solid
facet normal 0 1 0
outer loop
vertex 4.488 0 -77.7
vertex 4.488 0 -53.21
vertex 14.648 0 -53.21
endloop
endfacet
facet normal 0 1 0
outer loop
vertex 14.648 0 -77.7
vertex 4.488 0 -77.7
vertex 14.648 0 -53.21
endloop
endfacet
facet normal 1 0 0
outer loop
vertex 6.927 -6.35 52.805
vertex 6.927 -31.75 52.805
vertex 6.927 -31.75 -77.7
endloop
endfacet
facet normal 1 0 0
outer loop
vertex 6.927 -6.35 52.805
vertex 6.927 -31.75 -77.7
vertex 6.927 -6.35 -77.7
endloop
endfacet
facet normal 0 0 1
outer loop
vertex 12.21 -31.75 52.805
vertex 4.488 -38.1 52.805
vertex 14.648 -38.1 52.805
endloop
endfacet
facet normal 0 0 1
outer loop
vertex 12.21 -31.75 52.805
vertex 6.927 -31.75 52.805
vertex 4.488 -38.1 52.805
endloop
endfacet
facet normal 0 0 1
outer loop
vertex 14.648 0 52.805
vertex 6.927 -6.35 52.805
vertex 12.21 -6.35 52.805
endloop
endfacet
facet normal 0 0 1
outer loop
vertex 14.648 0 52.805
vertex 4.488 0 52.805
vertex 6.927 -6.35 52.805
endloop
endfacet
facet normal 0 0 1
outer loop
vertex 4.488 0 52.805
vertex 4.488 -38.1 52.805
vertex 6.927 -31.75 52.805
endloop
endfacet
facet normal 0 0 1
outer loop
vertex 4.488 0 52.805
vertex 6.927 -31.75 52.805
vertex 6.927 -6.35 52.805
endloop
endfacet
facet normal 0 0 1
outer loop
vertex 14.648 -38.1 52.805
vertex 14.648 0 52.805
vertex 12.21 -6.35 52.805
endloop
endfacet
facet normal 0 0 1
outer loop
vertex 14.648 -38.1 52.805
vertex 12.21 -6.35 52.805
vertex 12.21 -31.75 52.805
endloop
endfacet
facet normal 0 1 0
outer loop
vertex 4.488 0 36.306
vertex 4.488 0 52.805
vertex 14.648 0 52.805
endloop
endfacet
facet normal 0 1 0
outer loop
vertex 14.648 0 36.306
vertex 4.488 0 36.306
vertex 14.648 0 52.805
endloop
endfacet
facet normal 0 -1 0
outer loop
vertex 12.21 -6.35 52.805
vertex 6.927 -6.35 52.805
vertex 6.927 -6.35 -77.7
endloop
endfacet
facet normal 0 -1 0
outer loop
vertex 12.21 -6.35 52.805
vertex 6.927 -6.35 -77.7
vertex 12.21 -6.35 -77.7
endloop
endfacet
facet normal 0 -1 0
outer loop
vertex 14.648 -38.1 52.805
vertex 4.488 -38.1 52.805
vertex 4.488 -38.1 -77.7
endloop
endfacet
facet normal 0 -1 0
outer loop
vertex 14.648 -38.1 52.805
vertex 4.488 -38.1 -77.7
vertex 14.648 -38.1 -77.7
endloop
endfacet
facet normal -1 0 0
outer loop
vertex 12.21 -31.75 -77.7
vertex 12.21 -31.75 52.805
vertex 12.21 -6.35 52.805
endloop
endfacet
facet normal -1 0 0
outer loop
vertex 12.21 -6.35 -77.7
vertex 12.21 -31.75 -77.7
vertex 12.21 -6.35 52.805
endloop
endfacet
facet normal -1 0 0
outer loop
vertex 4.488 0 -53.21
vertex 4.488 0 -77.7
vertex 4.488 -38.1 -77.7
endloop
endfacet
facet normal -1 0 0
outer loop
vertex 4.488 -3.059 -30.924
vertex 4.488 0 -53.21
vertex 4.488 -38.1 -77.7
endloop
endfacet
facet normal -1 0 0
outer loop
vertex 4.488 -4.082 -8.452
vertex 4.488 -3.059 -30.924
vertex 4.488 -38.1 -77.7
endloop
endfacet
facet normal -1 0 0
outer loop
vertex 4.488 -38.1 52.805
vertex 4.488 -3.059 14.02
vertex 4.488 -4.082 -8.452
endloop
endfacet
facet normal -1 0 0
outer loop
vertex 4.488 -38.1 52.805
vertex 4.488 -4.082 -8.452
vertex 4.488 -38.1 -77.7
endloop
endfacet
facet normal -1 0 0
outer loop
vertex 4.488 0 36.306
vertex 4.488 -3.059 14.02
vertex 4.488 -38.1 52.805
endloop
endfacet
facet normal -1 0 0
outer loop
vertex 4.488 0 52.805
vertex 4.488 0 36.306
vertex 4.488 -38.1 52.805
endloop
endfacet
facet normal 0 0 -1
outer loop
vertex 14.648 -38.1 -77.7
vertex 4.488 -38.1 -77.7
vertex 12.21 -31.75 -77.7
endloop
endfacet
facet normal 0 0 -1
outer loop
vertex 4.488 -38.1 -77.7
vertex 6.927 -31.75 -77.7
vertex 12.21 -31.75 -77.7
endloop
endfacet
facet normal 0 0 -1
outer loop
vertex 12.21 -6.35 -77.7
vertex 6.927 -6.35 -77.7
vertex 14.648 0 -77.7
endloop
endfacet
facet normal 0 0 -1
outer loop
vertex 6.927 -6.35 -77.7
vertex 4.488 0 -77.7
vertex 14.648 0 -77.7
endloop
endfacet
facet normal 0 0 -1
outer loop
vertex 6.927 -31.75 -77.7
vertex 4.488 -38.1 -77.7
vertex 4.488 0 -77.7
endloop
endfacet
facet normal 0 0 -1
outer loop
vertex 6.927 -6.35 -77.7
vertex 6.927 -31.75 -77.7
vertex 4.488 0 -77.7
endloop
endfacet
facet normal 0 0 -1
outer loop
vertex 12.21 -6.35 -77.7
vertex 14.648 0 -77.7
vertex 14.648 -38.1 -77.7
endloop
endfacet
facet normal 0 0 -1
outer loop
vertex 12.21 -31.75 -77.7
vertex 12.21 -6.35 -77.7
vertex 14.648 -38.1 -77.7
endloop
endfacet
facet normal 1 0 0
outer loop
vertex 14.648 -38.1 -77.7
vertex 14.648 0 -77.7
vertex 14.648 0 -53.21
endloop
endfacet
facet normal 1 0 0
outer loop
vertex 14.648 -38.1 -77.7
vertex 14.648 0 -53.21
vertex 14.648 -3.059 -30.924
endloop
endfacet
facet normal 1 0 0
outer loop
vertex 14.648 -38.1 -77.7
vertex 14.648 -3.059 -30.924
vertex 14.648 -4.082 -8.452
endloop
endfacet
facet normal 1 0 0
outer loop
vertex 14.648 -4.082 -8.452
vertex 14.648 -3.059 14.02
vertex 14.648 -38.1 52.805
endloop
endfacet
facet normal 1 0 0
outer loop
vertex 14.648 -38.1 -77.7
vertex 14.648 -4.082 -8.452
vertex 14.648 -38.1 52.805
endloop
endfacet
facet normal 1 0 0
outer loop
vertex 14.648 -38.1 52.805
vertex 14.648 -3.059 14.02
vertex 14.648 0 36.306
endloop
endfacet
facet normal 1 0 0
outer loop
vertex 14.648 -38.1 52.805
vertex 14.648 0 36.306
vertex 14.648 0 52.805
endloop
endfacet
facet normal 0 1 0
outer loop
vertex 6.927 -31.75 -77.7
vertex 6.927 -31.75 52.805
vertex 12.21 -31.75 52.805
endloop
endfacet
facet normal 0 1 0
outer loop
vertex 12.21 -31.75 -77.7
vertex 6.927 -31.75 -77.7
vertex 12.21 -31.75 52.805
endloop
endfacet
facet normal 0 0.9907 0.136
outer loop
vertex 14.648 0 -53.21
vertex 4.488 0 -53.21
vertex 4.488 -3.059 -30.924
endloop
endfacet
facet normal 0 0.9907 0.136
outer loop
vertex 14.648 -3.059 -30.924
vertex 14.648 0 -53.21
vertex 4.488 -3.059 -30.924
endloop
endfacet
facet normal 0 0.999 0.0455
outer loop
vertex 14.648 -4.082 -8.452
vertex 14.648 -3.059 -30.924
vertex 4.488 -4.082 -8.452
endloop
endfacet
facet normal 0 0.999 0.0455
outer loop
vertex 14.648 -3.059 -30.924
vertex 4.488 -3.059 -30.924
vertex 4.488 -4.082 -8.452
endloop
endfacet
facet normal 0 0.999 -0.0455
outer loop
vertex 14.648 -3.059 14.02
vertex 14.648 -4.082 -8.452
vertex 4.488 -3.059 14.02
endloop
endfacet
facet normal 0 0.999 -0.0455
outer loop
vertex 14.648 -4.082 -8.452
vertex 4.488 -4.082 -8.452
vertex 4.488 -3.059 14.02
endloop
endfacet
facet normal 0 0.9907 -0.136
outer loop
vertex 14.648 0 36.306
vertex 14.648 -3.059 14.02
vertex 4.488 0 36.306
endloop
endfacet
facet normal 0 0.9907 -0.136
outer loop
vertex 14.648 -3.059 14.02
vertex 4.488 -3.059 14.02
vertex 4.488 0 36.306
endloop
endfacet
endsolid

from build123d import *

# Parameters (mm, degrees)
F0_W     = 10.16
F0_H     = 130.5052
F1_DEPTH = 38.1
F5_DEPTH = 25.4
F3_W     = 5.2832
F3_H     = 25.4
F6_DEPTH = 152.4


with BuildPart() as f1:
    # F0 (on Front) → F1 (new body)
    with BuildSketch(Plane.XZ):
        with Locations((9.568245, -12.447174)):
            Rectangle(F0_W, F0_H)
    extrude(amount=F1_DEPTH)

    # F4 (on face) → F5 (cut)
    with BuildSketch(Plane(origin=(4.488245, 0, 0), x_dir=(0, -1, 0), z_dir=(-1, 0, 0))):
        with BuildLine():
            Line((0, 36.306467), (0, -53.210054))
            ThreePointArc((0, -53.210054), (4.081656, -8.451793), (0, 36.306467))
        make_face()
    extrude(amount=-F5_DEPTH, mode=Mode.SUBTRACT)

    # F3 (on face) → F6 (cut)
    with BuildSketch(Plane.XY.offset(52.805426)):
        with Locations((9.568245, -19.05)):
            Rectangle(F3_W, F3_H)
    extrude(amount=-F6_DEPTH, mode=Mode.SUBTRACT)


solid = f1.part
